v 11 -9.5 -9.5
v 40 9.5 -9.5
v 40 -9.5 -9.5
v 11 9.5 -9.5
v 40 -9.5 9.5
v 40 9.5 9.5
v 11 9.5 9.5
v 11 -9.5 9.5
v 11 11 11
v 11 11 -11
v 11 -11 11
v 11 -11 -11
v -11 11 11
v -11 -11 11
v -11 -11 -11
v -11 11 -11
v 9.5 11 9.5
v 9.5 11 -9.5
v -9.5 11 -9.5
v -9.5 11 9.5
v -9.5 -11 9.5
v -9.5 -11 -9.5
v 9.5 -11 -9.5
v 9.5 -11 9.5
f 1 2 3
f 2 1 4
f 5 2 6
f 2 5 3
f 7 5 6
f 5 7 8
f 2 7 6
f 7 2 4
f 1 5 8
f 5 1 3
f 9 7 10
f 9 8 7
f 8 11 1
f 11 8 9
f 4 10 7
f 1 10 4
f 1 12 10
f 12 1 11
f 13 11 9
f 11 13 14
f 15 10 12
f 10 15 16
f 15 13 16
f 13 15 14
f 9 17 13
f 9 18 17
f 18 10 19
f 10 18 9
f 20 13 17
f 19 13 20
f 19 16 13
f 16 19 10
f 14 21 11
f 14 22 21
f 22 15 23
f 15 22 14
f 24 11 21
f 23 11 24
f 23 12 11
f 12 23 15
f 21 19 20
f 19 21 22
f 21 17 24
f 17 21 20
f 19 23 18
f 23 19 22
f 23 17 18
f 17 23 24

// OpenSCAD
profil=20;
stena=1;
tloustka=2;

vnitek=profil-stena;

difference(){
	union(){
		rotate([0,90,0]) translate([0,0,profil])cube([vnitek,vnitek,2*profil],center = true);
		cube([profil+tloustka,profil+tloustka,profil+tloustka], center = true);
	}
	rotate([90,0,0]) cube([vnitek,vnitek,2*profil],center = true);
}
